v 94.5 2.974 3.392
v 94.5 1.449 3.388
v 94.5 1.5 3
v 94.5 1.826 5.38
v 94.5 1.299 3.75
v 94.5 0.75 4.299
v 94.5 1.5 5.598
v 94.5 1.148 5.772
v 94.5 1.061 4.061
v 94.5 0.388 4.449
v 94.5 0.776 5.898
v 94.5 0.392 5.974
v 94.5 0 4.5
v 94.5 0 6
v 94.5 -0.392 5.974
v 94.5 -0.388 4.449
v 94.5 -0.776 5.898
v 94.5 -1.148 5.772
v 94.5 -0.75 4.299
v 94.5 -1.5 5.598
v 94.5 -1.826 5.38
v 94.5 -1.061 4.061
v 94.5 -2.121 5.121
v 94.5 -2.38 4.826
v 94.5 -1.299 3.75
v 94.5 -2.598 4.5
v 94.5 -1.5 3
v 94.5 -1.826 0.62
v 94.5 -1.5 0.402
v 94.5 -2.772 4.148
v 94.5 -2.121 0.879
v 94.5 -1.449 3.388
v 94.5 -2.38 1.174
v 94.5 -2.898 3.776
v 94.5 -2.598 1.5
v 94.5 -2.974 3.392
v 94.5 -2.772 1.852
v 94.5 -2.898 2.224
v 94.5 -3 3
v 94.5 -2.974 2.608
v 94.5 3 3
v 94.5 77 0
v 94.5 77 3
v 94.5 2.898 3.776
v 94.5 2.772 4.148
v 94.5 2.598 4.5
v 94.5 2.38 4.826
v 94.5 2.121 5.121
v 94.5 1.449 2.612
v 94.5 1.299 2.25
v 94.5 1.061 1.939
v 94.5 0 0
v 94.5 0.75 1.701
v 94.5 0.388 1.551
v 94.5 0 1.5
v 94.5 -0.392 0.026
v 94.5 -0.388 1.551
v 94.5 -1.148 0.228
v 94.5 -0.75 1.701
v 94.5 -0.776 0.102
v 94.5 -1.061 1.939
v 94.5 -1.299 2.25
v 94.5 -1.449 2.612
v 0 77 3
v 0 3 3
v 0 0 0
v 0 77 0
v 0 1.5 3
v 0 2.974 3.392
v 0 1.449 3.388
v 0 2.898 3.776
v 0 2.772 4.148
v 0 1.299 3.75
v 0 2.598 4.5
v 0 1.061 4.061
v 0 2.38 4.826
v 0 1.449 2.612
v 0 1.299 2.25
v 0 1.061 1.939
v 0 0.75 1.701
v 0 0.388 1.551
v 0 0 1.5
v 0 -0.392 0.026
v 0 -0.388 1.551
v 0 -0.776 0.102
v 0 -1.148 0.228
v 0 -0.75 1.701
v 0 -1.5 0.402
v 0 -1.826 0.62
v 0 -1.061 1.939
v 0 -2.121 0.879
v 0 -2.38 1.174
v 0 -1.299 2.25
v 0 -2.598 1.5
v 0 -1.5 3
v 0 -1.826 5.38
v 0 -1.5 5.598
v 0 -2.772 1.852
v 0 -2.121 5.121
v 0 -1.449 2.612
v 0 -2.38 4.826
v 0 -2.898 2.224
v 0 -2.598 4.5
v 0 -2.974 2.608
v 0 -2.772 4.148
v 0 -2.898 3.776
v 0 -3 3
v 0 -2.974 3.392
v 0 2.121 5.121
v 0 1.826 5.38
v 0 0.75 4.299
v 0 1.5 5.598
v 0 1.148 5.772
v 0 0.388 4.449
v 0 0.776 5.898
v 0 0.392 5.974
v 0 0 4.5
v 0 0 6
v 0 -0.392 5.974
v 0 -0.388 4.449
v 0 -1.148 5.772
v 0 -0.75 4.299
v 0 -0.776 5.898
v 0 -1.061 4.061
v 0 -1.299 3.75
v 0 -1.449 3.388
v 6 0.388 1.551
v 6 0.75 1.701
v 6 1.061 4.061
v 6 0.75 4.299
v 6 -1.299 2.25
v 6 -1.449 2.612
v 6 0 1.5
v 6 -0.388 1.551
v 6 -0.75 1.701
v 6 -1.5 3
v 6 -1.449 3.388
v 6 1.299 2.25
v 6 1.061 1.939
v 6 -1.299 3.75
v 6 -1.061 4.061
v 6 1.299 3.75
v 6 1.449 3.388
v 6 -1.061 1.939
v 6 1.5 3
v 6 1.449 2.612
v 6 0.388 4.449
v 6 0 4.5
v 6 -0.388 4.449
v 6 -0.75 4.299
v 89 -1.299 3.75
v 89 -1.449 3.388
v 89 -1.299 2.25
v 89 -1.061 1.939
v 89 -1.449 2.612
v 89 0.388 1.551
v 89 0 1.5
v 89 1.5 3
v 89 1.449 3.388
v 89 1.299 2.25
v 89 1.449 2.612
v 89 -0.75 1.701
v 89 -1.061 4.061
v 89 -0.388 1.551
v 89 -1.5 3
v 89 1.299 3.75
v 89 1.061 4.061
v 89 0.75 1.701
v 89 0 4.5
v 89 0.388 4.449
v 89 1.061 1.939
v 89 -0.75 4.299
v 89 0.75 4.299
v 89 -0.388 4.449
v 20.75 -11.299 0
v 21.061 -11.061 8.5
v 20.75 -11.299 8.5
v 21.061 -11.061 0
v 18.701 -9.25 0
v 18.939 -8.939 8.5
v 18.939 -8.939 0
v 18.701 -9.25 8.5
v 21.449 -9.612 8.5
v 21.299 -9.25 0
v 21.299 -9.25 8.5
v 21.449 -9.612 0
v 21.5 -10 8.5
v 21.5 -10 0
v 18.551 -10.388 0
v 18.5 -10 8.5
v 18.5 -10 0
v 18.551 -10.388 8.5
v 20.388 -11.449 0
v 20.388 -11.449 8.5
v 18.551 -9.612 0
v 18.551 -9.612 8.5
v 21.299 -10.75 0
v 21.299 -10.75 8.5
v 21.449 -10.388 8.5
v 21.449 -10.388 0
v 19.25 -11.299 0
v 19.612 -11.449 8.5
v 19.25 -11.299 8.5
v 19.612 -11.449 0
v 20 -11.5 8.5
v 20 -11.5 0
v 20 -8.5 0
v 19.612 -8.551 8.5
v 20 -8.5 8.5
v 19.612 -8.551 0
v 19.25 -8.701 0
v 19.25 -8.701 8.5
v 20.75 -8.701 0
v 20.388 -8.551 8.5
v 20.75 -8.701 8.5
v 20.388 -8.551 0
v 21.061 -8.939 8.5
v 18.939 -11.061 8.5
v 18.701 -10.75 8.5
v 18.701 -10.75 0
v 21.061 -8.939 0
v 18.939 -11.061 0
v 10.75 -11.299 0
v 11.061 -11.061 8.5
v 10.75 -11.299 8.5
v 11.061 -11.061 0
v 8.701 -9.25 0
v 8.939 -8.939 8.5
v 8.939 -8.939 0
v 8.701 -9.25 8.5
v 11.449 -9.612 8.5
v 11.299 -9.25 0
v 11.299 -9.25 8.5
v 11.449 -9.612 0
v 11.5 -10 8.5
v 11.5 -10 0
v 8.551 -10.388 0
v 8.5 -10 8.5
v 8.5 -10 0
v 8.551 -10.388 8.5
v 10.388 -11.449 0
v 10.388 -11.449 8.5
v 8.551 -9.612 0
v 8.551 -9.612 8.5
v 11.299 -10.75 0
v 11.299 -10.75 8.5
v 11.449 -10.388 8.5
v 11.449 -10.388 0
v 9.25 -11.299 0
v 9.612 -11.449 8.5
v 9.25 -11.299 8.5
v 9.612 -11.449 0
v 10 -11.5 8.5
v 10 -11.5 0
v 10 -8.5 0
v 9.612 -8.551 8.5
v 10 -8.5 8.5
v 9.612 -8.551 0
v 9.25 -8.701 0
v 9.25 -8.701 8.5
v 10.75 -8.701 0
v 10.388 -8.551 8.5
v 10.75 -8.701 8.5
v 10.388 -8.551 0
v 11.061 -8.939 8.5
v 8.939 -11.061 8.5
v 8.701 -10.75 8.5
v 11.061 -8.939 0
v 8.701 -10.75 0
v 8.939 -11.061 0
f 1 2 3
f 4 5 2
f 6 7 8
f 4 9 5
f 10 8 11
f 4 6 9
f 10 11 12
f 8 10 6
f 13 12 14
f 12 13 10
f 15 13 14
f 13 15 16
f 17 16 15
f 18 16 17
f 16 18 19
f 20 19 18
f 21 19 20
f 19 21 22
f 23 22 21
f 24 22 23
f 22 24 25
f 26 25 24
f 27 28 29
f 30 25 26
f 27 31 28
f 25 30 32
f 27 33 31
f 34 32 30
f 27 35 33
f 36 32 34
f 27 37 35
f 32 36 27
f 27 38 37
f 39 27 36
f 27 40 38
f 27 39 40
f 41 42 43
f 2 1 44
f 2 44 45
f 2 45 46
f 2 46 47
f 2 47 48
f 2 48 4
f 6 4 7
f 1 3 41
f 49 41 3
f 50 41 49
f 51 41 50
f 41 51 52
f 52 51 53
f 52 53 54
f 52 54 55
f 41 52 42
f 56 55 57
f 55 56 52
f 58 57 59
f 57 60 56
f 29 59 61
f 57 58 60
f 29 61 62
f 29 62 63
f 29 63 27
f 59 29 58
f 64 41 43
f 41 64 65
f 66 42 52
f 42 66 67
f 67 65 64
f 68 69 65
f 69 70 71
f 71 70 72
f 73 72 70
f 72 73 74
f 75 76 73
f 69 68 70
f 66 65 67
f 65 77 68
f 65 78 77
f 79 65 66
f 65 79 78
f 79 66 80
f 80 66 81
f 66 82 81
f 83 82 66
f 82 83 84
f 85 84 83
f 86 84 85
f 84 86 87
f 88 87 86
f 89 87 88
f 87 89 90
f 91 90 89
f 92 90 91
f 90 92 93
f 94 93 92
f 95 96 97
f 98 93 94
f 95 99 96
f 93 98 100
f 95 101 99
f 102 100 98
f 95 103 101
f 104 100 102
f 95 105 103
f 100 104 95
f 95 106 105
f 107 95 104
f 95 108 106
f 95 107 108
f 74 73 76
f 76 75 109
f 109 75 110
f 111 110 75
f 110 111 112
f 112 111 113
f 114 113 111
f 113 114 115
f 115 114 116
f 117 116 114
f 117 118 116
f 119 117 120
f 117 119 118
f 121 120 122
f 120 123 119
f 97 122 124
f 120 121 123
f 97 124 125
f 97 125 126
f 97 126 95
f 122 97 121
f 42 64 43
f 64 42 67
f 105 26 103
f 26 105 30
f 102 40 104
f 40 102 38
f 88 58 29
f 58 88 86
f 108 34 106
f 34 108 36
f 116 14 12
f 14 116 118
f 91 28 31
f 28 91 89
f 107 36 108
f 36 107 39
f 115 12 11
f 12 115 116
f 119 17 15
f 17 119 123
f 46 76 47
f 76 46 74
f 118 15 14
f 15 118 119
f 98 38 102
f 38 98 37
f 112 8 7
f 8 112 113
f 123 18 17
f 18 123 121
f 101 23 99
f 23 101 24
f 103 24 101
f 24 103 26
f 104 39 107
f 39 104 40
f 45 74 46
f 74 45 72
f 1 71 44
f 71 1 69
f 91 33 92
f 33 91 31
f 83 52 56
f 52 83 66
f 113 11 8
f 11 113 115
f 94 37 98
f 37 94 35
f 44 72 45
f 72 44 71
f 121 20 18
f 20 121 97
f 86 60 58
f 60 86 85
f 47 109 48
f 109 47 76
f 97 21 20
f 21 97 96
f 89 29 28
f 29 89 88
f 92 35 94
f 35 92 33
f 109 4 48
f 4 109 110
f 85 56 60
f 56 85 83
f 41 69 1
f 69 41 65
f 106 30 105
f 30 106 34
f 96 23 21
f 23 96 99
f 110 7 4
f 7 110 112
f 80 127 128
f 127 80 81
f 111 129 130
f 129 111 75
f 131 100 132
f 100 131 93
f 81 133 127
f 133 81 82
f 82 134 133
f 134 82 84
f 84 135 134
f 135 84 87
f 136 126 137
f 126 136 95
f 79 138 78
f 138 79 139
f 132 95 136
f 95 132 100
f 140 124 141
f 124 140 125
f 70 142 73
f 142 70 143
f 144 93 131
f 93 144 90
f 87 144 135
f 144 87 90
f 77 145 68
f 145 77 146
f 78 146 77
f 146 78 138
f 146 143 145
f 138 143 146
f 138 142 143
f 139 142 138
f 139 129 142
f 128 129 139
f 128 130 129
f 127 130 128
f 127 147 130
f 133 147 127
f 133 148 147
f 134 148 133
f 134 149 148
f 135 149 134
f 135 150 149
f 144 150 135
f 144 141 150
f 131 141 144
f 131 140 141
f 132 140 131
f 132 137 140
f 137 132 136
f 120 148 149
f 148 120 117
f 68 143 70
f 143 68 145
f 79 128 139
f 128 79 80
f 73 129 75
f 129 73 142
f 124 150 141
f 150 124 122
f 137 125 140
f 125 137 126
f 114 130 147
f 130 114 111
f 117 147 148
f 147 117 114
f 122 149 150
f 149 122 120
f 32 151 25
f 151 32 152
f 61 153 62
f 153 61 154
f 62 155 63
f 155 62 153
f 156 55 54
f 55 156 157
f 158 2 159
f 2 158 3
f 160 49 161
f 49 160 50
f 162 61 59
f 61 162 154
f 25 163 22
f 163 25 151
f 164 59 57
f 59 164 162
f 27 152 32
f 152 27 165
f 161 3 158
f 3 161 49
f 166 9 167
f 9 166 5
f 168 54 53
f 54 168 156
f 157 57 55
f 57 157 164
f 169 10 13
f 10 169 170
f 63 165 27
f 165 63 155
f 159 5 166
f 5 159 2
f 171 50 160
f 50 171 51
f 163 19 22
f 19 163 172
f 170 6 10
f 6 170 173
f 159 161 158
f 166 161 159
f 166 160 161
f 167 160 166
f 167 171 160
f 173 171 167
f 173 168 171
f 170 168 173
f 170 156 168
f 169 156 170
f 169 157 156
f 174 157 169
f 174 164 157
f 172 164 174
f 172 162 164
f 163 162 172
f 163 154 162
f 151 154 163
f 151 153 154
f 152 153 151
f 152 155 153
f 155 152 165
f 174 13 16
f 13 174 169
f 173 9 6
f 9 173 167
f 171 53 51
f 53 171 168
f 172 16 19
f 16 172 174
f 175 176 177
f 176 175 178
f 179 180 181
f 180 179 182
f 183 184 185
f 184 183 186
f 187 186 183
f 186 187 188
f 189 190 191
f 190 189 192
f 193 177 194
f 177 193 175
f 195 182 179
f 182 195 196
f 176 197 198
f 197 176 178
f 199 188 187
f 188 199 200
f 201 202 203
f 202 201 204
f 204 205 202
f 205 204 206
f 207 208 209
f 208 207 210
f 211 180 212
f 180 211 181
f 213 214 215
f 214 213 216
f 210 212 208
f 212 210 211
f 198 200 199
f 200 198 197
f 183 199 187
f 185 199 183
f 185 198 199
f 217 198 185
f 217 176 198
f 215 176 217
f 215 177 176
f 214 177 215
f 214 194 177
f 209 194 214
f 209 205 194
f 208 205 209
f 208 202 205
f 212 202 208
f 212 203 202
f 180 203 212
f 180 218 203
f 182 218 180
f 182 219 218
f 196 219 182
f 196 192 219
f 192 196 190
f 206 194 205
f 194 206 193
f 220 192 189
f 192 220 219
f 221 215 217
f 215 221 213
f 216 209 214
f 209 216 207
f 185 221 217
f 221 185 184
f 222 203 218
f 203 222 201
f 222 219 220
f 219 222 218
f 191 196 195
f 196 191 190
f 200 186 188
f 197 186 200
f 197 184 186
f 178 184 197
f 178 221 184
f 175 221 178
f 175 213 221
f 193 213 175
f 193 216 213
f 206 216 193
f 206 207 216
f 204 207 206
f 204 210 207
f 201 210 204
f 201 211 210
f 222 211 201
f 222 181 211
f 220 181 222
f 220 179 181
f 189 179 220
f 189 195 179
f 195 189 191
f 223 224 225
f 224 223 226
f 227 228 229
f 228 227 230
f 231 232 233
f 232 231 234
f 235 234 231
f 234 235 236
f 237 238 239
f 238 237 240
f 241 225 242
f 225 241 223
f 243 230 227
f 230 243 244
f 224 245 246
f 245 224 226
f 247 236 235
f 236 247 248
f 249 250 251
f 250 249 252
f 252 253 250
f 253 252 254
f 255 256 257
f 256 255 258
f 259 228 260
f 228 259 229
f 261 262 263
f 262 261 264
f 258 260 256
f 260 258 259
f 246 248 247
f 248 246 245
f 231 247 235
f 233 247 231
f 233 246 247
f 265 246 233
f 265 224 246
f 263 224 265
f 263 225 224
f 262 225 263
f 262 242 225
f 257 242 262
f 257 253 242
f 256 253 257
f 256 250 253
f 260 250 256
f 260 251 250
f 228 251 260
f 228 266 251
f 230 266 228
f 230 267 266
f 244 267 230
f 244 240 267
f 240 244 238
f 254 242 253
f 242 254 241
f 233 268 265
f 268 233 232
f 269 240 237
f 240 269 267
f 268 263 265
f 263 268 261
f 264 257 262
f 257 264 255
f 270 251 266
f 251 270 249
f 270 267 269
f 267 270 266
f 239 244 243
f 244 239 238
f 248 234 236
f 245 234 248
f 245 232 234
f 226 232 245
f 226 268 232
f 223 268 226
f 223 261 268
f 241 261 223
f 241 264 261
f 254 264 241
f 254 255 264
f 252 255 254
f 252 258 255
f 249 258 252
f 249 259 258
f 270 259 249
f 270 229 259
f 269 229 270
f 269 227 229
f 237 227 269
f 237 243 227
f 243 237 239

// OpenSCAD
difference() {
union(){
cube([94.5, 75+2, 3]);
translate([0,0,3]) rotate([0,90,0]) cylinder(h=94.5, r=3);
}
translate([0,0,3]) rotate([0,90,0]) cylinder(h=6, r=1.5);
translate([95-6,0, 3]) rotate([0,90,0]) cylinder(h=6, r=1.5);
}

translate([20, -10, 0]) cylinder(h=8.5, r=1.5);
translate([10, -10, 0]) cylinder(h=8.5, r=1.5);

$fa = 1;
$fs = 0.4;
